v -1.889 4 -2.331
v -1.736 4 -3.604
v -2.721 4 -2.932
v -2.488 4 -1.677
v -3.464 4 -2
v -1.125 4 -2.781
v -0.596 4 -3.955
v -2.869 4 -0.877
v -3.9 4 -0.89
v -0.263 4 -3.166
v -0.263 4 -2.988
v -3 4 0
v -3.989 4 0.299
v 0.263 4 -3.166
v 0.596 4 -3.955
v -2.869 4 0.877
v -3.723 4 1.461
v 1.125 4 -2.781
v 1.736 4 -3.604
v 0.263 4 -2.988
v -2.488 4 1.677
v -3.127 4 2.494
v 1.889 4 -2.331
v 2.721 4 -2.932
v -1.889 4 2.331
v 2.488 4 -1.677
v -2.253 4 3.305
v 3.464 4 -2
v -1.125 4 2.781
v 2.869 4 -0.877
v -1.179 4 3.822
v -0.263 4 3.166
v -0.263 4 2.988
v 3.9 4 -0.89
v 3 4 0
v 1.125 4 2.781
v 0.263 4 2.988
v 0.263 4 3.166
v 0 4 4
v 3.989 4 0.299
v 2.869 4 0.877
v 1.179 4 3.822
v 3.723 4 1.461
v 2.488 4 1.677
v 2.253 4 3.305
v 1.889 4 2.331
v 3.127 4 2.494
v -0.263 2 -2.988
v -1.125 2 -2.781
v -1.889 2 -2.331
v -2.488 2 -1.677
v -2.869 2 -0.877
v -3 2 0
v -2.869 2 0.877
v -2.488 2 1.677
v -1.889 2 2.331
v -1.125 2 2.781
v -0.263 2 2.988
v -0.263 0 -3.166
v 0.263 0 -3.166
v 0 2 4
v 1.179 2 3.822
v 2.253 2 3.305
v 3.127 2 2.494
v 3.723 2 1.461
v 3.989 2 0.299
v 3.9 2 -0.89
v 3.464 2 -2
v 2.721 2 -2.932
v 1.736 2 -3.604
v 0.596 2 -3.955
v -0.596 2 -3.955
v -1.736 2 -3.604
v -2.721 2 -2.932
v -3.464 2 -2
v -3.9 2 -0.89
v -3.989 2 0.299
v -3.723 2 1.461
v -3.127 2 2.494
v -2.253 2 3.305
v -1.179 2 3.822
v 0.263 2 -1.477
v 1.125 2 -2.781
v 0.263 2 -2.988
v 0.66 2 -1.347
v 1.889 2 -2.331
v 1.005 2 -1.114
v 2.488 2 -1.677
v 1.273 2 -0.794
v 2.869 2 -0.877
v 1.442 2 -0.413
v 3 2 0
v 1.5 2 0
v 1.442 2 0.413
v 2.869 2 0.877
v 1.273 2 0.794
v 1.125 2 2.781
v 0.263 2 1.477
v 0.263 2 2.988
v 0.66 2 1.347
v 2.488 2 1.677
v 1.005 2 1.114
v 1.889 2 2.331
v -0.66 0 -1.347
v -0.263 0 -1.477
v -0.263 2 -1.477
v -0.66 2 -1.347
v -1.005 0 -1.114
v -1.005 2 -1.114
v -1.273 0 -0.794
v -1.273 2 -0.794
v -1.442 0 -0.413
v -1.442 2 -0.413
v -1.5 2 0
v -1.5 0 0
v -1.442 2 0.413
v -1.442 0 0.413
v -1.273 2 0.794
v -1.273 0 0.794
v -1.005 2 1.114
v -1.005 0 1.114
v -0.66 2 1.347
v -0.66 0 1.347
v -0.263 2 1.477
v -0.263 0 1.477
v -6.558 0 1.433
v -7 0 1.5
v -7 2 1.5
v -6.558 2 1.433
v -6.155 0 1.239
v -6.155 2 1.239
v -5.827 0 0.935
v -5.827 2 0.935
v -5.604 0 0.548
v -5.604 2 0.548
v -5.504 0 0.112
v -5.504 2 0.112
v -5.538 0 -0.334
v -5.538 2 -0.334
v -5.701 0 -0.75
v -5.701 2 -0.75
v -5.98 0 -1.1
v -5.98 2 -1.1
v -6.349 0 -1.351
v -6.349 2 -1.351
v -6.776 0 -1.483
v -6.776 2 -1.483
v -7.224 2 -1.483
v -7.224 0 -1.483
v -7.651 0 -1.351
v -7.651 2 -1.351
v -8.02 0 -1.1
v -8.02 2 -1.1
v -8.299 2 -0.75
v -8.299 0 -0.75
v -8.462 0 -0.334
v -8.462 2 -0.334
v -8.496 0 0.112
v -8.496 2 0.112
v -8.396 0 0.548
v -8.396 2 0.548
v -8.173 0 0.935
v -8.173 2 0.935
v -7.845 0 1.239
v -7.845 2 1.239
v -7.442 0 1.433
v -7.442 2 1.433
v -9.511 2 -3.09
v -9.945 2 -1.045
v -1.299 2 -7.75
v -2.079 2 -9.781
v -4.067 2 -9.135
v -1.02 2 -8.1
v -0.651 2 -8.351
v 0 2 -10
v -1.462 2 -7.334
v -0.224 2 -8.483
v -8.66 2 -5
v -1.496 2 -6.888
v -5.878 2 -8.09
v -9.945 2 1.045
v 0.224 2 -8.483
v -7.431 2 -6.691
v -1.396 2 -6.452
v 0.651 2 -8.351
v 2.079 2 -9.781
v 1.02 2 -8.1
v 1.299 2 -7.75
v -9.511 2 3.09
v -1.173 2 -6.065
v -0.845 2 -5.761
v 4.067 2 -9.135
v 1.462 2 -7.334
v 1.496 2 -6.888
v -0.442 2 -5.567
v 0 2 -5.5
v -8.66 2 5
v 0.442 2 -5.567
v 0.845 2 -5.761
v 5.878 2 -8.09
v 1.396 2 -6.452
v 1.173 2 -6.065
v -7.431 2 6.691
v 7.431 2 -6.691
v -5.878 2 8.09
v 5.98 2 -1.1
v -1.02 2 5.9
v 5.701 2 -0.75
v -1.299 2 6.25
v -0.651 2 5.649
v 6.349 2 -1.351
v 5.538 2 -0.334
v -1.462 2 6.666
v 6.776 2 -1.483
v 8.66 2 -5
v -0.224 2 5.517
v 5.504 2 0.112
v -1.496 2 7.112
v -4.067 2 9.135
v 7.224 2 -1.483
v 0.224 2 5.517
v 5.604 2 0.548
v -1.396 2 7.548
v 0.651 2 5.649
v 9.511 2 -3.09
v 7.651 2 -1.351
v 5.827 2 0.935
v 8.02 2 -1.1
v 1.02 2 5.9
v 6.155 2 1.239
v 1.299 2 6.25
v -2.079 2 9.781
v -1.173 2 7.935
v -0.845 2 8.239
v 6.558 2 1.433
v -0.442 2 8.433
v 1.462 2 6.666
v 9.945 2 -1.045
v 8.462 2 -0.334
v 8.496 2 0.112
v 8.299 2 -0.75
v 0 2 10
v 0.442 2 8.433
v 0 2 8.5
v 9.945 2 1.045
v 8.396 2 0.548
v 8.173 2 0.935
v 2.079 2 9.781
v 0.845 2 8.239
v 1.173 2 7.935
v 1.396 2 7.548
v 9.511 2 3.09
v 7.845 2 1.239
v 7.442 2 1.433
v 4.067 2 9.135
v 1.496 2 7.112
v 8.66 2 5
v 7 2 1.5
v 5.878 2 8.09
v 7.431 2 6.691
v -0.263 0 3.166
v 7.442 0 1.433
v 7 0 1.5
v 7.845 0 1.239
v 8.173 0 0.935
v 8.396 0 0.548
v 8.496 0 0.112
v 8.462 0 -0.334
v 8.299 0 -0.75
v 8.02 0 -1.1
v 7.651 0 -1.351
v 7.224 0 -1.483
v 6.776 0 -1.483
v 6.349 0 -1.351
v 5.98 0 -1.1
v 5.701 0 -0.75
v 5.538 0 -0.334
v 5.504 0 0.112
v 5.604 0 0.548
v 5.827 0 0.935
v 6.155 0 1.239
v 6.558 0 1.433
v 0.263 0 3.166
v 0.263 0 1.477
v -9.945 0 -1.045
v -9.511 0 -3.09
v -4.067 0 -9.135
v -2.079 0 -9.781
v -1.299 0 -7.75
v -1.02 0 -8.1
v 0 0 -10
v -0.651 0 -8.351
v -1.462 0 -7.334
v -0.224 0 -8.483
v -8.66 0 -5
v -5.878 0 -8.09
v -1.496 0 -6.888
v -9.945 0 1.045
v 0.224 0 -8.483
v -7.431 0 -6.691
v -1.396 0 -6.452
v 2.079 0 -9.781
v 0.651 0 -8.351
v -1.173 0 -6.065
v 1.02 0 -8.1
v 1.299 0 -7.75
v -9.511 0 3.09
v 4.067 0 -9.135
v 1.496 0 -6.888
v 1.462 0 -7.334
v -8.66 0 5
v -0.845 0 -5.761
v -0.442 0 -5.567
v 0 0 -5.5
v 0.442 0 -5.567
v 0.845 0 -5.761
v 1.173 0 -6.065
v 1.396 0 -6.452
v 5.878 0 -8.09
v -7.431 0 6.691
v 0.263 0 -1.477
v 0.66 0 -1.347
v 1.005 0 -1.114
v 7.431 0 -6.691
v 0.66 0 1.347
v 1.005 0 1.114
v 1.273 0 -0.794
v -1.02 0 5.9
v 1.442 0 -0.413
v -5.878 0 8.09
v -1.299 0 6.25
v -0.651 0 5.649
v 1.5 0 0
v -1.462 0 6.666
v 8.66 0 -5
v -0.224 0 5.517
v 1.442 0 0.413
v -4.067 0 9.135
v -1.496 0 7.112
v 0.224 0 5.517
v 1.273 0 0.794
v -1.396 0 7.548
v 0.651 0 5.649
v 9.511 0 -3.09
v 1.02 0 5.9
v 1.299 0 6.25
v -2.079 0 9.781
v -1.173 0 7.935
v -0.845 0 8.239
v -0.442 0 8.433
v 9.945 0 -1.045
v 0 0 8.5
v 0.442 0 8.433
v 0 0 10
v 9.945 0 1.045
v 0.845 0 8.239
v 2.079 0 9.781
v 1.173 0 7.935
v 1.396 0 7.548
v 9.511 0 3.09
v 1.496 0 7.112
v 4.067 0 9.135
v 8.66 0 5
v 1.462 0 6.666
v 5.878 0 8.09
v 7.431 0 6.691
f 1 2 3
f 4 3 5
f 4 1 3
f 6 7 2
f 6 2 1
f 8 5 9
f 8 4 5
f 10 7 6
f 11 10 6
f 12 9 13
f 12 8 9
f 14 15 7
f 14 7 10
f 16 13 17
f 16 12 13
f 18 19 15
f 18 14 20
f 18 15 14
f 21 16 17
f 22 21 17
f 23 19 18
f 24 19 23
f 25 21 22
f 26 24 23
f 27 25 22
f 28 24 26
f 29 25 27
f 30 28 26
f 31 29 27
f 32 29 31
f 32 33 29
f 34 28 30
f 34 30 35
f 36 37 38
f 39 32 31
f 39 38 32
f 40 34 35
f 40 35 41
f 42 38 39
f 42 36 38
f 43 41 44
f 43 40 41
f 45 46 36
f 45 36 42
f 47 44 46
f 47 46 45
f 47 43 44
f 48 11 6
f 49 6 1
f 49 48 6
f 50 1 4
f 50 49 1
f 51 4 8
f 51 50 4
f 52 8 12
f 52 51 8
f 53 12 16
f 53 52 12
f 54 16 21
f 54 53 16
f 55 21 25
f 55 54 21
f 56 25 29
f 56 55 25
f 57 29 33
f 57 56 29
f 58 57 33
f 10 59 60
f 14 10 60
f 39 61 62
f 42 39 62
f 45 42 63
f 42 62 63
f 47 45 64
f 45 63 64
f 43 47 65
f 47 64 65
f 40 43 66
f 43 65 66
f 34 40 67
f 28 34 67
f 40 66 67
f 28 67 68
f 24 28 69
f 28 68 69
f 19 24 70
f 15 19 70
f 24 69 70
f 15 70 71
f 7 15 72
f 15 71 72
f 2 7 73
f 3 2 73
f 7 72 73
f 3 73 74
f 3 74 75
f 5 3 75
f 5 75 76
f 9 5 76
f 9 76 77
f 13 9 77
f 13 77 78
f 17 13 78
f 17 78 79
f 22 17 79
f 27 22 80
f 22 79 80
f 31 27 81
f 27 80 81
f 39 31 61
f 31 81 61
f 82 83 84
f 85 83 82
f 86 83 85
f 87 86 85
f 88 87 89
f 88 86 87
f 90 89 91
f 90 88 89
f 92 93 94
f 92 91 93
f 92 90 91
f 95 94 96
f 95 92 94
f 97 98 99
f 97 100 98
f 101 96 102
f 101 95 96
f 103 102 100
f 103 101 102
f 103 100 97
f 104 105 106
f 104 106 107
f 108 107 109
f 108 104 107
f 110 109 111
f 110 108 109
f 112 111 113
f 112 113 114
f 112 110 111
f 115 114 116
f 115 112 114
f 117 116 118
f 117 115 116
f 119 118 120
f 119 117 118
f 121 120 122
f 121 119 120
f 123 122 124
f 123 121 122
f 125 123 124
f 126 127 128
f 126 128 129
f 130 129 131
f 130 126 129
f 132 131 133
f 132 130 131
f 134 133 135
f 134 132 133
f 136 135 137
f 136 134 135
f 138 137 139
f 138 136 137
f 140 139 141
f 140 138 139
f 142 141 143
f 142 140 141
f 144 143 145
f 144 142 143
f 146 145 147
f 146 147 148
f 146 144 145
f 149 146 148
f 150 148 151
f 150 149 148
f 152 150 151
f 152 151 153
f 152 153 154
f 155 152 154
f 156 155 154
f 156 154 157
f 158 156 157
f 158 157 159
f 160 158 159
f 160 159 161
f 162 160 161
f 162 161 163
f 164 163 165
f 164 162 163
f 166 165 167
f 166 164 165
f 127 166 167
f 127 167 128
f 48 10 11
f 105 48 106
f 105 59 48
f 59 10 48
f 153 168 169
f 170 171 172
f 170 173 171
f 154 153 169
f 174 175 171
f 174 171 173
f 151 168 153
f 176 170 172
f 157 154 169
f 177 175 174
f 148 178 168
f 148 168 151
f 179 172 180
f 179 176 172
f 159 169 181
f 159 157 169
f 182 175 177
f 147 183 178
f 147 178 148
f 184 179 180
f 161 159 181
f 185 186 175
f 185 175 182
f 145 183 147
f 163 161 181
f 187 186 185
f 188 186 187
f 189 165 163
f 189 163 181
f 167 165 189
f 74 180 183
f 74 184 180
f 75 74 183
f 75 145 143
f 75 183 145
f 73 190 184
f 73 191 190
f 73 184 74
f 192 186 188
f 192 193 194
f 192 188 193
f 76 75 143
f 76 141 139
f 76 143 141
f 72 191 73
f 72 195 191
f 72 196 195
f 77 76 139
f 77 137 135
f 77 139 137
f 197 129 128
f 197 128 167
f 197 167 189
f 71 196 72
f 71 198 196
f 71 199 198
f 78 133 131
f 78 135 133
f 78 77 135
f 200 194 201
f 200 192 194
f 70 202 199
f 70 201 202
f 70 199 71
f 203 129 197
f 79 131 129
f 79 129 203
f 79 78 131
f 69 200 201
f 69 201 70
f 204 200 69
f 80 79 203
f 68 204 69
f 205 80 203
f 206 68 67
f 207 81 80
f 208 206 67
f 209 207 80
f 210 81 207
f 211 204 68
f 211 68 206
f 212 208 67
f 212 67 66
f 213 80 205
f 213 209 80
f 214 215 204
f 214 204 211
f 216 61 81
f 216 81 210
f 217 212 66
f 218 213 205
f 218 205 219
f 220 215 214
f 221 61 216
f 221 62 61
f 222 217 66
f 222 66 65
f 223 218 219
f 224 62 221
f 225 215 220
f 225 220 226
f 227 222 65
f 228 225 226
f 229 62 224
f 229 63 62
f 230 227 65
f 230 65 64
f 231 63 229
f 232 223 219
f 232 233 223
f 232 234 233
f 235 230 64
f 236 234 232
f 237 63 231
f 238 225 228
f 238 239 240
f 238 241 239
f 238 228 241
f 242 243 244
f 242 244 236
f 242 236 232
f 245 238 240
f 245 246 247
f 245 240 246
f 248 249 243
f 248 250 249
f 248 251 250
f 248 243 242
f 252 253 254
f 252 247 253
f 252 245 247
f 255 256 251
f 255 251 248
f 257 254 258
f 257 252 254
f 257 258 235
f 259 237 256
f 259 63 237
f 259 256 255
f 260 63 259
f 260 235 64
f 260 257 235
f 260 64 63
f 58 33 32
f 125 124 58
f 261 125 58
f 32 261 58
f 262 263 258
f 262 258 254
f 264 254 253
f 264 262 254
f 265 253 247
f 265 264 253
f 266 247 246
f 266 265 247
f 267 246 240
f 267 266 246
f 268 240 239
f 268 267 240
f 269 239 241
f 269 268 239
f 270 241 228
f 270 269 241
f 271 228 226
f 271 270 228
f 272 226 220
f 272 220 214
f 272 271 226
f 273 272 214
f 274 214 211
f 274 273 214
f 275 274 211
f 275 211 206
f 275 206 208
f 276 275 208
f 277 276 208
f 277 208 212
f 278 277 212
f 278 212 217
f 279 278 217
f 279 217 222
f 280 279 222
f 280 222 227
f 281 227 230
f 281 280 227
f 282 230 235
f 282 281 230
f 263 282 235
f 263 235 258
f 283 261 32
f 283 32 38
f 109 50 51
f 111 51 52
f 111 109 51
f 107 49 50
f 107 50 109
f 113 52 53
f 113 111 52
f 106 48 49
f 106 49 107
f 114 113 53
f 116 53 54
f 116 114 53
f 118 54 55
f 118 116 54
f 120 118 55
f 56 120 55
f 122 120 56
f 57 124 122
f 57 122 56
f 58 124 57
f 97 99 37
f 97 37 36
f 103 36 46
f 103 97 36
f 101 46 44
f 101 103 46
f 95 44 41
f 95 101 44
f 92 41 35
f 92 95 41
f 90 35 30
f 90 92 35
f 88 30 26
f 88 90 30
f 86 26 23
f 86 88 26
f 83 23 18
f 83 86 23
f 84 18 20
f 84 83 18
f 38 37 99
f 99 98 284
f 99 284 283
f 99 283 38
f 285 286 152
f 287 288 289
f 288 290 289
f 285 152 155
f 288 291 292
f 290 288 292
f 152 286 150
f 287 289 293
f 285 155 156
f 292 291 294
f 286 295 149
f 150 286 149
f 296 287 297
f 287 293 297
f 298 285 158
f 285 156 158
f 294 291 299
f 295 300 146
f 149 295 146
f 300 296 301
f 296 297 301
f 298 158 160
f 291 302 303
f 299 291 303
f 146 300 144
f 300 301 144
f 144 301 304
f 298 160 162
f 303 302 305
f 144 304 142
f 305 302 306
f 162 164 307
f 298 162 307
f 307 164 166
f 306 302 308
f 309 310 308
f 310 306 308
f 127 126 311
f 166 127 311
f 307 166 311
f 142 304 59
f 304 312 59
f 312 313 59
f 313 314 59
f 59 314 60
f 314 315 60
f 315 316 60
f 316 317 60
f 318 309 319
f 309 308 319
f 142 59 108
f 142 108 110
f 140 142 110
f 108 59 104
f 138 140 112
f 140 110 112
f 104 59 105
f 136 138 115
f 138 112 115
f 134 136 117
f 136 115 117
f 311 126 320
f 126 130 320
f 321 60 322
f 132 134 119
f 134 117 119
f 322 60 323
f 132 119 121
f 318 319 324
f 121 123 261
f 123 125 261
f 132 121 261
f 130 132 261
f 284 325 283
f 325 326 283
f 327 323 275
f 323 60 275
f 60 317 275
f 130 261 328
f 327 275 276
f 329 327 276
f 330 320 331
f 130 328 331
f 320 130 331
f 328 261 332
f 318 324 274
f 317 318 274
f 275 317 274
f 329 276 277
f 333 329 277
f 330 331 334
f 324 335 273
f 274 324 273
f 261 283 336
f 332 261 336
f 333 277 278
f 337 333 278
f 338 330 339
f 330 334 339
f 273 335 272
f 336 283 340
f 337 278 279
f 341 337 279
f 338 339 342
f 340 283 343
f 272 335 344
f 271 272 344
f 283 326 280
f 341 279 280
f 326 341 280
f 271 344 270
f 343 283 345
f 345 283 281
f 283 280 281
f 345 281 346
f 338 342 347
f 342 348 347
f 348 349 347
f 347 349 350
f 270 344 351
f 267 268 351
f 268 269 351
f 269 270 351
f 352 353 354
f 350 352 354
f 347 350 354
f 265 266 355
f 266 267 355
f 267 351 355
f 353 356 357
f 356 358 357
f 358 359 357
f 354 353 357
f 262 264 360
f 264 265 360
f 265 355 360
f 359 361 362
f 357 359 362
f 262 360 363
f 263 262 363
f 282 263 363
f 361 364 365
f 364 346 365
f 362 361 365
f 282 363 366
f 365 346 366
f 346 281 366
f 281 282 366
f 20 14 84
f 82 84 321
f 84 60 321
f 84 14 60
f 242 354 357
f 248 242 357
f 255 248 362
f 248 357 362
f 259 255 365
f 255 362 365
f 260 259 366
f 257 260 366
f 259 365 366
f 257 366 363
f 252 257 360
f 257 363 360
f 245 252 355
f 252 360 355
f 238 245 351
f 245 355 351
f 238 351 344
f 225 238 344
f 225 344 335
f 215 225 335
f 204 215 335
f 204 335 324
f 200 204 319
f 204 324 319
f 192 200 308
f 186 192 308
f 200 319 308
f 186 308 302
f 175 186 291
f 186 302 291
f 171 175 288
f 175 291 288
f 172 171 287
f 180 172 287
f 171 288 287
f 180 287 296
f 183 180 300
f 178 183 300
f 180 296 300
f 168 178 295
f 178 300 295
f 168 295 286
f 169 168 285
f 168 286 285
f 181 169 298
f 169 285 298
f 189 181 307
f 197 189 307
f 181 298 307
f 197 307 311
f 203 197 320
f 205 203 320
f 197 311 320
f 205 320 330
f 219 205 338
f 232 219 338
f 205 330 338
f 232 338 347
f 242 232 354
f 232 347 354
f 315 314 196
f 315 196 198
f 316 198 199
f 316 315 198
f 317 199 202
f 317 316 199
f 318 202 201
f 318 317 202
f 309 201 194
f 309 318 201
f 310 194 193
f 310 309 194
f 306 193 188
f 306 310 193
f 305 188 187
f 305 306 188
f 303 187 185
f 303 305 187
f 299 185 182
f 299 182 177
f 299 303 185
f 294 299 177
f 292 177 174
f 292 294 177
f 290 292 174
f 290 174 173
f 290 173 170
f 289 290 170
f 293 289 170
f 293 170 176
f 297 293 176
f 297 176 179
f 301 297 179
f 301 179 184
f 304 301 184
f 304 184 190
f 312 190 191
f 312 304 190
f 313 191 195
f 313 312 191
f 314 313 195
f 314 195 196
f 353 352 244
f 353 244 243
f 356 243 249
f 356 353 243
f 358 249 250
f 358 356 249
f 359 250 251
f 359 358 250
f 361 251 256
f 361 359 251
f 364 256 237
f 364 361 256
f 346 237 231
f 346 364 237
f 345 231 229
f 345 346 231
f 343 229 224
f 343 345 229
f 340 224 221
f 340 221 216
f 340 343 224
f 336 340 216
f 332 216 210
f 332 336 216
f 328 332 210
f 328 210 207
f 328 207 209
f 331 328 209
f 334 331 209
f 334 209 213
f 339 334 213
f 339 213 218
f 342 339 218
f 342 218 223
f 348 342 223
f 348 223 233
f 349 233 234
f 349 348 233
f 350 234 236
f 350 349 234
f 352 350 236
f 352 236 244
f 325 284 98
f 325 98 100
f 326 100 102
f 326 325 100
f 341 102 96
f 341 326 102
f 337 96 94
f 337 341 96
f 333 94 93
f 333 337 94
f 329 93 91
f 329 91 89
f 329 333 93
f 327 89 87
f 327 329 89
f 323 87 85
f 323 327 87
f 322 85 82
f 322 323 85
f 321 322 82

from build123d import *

# Parameters (mm, degrees)
SKETCH_1_R          = 10
SKETCH_1_R_2        = 1.5
EXTRUDE_1_DEPTH     = 2
SKETCH_2_R          = 4
SKETCH_2_R_2        = 3
EXTRUDE_2_DEPTH     = 2
SKETCH_3_W          = 0.526425496
SKETCH_3_H          = 6.332921184
CUT_EXTRUDE_1_DEPTH = 4


with BuildPart() as part:
    # 草图1 → 凸台-拉伸1 (new body)
    with BuildSketch(Plane(origin=(0, 0, 0), x_dir=(1, 0, 0), z_dir=(0, 1, 0))):
        with Locations(Location((0, 0, 0), (0, 0, 270))):
            Circle(SKETCH_1_R)
        with Locations(Location((7, 0, 0), (0, 0, 270))):
            Circle(SKETCH_1_R_2, mode=Mode.SUBTRACT)
        with Locations(Location((0, 0, 0), (0, 0, 270))):
            Circle(SKETCH_1_R_2, mode=Mode.SUBTRACT)
        with Locations(Location((0, -7, 0), (0, 0, 270))):
            Circle(SKETCH_1_R_2, mode=Mode.SUBTRACT)
        with Locations(Location((-7, 0, 0), (0, 0, 270))):
            Circle(SKETCH_1_R_2, mode=Mode.SUBTRACT)
        with Locations(Location((0, 7, 0), (0, 0, 270))):
            Circle(SKETCH_1_R_2, mode=Mode.SUBTRACT)
    extrude(amount=EXTRUDE_1_DEPTH)

    # 草图2 → 凸台-拉伸2 (add)
    with BuildSketch(Plane(origin=(0, 2, 0), x_dir=(1, 0, 0), z_dir=(0, 1, 0))):
        with Locations(Location((0, 0, 0), (0, 0, 270))):
            Circle(SKETCH_2_R)
        with Locations(Location((0, 0, 0), (0, 0, 270))):
            Circle(SKETCH_2_R_2, mode=Mode.SUBTRACT)
    extrude(amount=EXTRUDE_2_DEPTH)

    # 草图3 → 切除-拉伸1 (cut)
    with BuildSketch(Plane.XZ):
        Rectangle(SKETCH_3_W, SKETCH_3_H)
    extrude(amount=-CUT_EXTRUDE_1_DEPTH, mode=Mode.SUBTRACT)


solid = part.part
